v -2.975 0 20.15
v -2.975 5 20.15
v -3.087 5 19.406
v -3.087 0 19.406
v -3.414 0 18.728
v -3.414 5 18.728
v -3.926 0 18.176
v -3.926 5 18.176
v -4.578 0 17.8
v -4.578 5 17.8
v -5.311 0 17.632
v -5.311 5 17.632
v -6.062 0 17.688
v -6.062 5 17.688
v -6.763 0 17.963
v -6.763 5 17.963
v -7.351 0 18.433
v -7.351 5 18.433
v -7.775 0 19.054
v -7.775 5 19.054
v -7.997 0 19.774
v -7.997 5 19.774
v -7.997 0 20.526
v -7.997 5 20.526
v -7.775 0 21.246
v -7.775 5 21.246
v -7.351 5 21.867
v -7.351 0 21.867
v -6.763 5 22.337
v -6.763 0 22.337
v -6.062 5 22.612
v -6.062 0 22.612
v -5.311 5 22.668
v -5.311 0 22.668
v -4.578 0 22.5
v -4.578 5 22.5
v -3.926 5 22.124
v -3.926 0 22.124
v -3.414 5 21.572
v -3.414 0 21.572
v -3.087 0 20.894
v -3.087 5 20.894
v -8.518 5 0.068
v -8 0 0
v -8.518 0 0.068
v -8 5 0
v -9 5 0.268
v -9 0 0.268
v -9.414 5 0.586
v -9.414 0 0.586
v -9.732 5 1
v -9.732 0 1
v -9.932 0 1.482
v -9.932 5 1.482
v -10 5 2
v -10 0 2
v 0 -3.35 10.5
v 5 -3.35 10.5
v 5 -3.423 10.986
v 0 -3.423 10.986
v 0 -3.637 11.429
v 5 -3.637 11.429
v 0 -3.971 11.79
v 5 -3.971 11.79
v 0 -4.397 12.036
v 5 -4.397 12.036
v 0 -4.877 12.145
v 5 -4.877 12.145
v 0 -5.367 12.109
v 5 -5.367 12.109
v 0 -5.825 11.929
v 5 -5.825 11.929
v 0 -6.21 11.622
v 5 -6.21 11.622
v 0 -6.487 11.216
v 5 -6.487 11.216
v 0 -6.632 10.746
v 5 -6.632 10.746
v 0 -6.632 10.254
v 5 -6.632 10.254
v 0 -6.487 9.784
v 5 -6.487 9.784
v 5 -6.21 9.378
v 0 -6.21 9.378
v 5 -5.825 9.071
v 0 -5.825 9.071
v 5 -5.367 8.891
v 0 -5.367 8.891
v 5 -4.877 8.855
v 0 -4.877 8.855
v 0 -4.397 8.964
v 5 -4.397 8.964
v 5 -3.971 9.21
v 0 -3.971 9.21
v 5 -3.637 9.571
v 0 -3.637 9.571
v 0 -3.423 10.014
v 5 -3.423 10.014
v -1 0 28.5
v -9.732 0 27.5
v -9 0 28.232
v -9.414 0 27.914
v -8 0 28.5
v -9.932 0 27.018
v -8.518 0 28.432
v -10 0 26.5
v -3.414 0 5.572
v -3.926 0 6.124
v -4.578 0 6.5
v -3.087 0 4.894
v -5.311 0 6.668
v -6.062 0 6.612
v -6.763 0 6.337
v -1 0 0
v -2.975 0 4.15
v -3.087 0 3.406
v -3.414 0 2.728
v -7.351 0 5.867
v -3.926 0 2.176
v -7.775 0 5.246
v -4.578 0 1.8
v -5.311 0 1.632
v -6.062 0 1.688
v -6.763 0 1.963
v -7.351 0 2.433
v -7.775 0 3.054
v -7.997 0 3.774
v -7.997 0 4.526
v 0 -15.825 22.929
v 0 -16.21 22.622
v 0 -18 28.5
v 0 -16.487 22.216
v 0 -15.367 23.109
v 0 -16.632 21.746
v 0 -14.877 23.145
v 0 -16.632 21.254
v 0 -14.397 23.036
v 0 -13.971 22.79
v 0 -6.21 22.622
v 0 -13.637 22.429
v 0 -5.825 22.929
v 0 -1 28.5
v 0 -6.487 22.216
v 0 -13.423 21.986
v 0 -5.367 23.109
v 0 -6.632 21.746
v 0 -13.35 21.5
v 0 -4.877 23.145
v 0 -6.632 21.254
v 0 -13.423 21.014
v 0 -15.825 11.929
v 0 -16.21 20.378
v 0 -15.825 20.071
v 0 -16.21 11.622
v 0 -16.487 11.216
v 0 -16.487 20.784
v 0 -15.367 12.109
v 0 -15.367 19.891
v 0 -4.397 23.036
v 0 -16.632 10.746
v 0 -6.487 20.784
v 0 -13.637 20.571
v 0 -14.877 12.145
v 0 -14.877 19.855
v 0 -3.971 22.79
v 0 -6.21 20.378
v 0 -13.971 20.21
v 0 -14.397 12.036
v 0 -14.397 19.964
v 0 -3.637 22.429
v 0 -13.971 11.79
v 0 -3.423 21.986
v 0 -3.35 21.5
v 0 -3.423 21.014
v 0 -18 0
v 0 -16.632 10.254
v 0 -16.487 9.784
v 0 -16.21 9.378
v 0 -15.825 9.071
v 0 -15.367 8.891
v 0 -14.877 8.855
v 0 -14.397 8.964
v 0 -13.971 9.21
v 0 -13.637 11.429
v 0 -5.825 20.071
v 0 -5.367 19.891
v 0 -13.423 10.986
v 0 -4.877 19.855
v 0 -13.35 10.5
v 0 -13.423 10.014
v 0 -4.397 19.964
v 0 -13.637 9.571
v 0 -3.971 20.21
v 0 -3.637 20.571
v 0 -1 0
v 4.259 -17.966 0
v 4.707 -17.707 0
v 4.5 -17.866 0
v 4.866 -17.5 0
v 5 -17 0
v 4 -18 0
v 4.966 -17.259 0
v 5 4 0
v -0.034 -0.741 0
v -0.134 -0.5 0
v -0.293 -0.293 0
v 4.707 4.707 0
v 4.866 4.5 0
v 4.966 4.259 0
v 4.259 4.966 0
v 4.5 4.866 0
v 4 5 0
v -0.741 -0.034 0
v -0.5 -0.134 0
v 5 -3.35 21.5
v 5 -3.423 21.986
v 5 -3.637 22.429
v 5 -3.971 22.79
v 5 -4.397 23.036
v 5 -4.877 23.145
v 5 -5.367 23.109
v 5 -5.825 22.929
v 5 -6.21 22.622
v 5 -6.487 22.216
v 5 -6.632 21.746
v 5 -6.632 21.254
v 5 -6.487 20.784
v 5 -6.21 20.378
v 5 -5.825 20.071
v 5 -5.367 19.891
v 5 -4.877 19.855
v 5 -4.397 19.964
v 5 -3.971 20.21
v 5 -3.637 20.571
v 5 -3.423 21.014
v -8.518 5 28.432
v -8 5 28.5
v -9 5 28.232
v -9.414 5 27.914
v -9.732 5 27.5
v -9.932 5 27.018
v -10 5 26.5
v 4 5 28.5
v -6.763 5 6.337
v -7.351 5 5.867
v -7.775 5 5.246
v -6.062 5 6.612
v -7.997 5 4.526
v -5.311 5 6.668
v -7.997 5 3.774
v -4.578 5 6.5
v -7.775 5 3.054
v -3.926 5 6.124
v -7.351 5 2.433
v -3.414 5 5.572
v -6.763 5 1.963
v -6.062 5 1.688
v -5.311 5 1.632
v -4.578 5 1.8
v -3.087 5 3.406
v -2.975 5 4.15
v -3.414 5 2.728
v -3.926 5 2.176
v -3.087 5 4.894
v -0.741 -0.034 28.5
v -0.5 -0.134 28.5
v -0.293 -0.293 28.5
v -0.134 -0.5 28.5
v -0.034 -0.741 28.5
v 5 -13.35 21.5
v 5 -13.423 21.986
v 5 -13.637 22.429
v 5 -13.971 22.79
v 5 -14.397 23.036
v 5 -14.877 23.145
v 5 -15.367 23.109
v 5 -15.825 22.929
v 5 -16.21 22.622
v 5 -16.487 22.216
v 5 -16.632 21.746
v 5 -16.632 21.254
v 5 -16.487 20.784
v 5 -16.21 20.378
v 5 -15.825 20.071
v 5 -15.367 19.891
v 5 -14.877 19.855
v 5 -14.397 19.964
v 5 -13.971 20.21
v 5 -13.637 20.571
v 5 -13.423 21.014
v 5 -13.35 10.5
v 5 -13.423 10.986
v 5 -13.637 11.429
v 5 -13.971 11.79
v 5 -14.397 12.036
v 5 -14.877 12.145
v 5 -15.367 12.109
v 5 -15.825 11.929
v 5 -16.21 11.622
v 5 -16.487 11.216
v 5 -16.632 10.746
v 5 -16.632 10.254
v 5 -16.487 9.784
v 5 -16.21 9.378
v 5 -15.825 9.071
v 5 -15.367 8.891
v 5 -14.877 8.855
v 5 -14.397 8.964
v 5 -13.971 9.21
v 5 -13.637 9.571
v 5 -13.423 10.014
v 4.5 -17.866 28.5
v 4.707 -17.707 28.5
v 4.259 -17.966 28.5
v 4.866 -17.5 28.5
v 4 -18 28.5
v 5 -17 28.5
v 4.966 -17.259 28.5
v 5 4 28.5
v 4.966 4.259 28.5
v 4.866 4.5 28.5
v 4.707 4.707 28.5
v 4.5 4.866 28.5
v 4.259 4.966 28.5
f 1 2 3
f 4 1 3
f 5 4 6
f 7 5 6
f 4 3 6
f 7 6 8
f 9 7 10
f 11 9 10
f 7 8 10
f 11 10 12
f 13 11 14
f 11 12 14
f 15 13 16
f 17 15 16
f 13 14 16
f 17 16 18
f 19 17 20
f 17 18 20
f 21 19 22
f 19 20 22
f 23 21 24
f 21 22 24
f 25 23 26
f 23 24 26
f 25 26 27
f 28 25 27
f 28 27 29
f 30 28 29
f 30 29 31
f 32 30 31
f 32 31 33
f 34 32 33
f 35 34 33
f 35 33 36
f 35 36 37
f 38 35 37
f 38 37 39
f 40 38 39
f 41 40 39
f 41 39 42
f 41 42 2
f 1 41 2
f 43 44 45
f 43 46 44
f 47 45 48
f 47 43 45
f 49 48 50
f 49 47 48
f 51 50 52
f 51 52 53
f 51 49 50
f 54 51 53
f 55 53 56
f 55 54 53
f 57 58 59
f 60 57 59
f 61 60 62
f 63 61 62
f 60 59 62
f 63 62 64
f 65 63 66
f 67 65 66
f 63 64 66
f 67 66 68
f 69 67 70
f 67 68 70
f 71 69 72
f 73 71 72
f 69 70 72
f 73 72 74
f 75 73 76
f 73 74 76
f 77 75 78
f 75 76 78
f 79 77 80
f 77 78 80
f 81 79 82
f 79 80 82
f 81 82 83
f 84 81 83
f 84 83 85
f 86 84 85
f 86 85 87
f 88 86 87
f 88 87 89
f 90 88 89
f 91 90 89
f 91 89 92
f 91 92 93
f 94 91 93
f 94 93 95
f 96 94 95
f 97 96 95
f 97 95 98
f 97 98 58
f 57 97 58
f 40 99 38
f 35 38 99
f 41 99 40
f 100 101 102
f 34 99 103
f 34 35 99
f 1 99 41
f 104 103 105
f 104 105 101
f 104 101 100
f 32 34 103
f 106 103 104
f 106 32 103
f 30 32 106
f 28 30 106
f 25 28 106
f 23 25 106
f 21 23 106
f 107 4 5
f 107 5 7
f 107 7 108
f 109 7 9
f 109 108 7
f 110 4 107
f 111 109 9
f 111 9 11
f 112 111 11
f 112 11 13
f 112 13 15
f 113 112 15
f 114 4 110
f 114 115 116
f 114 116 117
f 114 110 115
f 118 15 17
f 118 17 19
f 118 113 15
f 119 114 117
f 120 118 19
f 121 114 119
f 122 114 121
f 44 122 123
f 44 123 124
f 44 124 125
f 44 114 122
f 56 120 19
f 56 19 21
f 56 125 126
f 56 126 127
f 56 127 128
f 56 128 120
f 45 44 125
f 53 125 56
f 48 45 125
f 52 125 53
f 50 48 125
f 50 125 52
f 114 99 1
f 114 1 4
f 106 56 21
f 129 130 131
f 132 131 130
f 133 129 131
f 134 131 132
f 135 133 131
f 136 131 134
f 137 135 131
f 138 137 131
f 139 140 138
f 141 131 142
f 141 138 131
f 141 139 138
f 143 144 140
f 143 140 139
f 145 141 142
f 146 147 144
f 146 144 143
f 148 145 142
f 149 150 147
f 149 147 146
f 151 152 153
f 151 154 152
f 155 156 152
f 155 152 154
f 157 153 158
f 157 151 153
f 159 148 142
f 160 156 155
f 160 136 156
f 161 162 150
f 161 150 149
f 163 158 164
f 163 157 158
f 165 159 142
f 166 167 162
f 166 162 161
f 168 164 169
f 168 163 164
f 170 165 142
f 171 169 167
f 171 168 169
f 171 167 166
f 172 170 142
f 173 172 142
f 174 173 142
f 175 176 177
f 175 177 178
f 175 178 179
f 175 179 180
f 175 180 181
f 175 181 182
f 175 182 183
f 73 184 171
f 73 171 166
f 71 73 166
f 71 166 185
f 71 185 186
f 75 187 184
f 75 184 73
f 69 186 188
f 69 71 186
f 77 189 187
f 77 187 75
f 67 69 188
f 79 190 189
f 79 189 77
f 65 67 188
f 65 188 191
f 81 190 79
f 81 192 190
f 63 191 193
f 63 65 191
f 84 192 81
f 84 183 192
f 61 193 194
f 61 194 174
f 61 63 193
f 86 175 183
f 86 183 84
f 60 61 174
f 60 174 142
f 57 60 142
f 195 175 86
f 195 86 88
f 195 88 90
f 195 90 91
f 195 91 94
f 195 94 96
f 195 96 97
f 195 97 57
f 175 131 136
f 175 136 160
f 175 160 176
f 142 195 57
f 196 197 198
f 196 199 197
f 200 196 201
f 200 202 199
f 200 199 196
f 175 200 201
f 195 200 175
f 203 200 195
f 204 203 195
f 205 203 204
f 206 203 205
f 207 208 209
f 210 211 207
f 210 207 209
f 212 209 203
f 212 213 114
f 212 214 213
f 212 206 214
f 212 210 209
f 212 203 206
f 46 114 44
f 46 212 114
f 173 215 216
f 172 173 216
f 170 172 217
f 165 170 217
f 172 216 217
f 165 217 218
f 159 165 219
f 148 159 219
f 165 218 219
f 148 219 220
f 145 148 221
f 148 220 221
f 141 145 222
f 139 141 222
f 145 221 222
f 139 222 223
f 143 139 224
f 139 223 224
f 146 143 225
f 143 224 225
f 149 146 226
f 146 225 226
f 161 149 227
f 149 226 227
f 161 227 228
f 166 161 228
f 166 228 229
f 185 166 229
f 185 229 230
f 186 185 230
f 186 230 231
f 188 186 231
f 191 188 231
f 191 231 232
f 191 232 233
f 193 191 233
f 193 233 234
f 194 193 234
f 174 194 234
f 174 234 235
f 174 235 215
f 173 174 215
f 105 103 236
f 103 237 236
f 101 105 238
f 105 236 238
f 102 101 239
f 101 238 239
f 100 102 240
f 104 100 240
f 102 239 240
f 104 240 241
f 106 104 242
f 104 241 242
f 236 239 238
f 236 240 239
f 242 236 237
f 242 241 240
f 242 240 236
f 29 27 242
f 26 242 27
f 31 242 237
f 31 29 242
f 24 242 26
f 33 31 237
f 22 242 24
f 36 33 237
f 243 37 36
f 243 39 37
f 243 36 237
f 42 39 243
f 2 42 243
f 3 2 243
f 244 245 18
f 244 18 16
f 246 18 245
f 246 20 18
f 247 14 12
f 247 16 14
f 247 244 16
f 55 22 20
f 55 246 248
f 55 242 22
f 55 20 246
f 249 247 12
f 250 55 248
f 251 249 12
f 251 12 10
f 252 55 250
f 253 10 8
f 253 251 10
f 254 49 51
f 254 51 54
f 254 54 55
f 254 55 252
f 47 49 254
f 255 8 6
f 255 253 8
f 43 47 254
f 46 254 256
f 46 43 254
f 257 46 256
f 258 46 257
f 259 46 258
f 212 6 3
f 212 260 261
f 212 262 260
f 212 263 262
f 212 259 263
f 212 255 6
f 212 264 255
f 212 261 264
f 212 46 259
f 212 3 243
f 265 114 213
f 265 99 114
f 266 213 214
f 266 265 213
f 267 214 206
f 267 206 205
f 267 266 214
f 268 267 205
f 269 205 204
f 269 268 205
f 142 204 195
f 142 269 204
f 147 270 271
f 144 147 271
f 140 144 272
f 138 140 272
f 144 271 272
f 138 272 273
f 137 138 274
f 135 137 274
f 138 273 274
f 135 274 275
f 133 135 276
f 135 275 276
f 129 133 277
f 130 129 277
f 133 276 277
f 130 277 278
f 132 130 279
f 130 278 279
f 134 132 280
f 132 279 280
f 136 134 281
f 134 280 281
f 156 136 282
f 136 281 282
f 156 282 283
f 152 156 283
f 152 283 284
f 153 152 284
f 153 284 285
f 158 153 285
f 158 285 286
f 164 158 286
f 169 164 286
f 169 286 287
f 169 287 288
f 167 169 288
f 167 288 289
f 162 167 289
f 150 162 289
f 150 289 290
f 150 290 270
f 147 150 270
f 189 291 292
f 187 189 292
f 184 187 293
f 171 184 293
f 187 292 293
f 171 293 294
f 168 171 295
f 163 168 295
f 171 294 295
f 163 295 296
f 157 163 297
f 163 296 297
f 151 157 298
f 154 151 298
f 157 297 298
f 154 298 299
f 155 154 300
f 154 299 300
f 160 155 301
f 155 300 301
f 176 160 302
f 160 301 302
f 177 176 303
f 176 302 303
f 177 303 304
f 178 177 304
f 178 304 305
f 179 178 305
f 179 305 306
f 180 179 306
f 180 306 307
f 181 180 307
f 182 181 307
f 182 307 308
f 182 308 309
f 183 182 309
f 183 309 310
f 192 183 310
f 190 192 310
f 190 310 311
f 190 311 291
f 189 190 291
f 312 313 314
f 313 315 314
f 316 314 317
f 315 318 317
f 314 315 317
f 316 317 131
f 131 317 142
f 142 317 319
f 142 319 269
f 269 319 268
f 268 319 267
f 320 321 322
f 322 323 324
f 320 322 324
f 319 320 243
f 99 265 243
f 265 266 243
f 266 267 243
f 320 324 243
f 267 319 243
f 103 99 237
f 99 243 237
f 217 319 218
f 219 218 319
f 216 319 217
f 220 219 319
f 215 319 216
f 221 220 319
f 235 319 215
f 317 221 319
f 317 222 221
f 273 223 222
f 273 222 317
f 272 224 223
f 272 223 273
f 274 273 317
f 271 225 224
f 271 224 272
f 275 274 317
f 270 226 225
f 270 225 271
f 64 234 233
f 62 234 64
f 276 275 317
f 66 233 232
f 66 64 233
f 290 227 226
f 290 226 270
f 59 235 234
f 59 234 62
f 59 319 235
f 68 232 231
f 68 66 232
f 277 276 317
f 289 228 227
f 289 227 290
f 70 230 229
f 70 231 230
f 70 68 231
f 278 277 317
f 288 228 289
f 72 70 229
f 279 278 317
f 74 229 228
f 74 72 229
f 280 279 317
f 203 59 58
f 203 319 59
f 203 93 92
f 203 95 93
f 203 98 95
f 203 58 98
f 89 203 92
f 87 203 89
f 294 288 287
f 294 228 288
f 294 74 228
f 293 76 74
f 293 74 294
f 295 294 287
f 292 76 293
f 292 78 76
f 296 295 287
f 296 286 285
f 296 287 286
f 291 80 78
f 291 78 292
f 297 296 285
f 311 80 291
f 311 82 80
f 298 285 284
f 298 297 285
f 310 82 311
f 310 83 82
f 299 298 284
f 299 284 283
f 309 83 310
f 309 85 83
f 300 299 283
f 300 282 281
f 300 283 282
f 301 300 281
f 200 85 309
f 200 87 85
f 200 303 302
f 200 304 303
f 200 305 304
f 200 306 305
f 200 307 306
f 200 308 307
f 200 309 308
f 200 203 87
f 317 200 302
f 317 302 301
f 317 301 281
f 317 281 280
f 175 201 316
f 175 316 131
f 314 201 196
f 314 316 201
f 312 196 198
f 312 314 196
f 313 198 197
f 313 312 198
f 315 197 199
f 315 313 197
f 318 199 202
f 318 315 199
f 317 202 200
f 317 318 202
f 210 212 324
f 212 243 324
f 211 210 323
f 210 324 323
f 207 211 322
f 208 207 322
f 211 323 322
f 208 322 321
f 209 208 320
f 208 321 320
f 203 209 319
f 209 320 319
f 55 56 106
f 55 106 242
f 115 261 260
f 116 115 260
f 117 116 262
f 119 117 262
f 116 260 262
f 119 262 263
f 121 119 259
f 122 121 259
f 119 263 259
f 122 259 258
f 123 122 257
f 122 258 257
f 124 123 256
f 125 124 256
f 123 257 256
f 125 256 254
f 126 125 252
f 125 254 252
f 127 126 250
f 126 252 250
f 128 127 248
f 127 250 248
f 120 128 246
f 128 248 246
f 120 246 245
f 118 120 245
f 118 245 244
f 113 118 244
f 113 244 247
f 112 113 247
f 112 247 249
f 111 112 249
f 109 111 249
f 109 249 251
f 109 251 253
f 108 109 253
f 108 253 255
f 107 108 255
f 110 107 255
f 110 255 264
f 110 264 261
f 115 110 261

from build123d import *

# Parameters (mm, degrees)
EXTRUDE_1_DEPTH     = 28.5
SKETCH_2_R          = 2.525
CUT_EXTRUDE_1_DEPTH = 28.5
HOLE_WIZARD_M4_1_D  = 3.3
FILLET_1_R          = 2
FILLET_2_R          = 1


with BuildPart() as part:
    # 草图1 → 凸台-拉伸1 (new body)
    with BuildSketch(Plane.XY):
        Polygon((0, 0), (-10, 0), (-10, 5), (5, 5), (5, -18), (0, -18), align=None)
    extrude(amount=EXTRUDE_1_DEPTH)

    # 草图2 → 切除-拉伸1 (cut)
    with BuildSketch(Plane(origin=(0, 5, 0), x_dir=(1, 0, 0), z_dir=(0, 1, 0))):
        with Locations((-5.5, -4.15)):
            Circle(SKETCH_2_R)
        with Locations((-5.5, -20.15)):
            Circle(SKETCH_2_R)
    extrude(amount=-CUT_EXTRUDE_1_DEPTH, mode=Mode.SUBTRACT)

    # M4 螺纹孔1 (through all)
    with Locations(Plane(origin=(0, -5, 10.5), x_dir=(0, -1, 0), z_dir=(-1, 0, 0))):
        with Locations((0, 0), (10, 0), (10, 11), (0, 11)):
            Hole(HOLE_WIZARD_M4_1_D / 2)

    # 圆角1
    fillet_1_edges = [part.edges().sort_by_distance(p)[0] for p in [
        (-10, 2.5, 28.5),
        (-10, 2.5, 0),
    ]]
    fillet(fillet_1_edges, radius=FILLET_1_R)

    # 圆角2
    fillet_2_edges = [part.edges().sort_by_distance(p)[0] for p in [
        (0, 0, 14.25),
        (5, 5, 14.25),
        (5, -18, 14.25),
    ]]
    fillet(fillet_2_edges, radius=FILLET_2_R)


solid = part.part
